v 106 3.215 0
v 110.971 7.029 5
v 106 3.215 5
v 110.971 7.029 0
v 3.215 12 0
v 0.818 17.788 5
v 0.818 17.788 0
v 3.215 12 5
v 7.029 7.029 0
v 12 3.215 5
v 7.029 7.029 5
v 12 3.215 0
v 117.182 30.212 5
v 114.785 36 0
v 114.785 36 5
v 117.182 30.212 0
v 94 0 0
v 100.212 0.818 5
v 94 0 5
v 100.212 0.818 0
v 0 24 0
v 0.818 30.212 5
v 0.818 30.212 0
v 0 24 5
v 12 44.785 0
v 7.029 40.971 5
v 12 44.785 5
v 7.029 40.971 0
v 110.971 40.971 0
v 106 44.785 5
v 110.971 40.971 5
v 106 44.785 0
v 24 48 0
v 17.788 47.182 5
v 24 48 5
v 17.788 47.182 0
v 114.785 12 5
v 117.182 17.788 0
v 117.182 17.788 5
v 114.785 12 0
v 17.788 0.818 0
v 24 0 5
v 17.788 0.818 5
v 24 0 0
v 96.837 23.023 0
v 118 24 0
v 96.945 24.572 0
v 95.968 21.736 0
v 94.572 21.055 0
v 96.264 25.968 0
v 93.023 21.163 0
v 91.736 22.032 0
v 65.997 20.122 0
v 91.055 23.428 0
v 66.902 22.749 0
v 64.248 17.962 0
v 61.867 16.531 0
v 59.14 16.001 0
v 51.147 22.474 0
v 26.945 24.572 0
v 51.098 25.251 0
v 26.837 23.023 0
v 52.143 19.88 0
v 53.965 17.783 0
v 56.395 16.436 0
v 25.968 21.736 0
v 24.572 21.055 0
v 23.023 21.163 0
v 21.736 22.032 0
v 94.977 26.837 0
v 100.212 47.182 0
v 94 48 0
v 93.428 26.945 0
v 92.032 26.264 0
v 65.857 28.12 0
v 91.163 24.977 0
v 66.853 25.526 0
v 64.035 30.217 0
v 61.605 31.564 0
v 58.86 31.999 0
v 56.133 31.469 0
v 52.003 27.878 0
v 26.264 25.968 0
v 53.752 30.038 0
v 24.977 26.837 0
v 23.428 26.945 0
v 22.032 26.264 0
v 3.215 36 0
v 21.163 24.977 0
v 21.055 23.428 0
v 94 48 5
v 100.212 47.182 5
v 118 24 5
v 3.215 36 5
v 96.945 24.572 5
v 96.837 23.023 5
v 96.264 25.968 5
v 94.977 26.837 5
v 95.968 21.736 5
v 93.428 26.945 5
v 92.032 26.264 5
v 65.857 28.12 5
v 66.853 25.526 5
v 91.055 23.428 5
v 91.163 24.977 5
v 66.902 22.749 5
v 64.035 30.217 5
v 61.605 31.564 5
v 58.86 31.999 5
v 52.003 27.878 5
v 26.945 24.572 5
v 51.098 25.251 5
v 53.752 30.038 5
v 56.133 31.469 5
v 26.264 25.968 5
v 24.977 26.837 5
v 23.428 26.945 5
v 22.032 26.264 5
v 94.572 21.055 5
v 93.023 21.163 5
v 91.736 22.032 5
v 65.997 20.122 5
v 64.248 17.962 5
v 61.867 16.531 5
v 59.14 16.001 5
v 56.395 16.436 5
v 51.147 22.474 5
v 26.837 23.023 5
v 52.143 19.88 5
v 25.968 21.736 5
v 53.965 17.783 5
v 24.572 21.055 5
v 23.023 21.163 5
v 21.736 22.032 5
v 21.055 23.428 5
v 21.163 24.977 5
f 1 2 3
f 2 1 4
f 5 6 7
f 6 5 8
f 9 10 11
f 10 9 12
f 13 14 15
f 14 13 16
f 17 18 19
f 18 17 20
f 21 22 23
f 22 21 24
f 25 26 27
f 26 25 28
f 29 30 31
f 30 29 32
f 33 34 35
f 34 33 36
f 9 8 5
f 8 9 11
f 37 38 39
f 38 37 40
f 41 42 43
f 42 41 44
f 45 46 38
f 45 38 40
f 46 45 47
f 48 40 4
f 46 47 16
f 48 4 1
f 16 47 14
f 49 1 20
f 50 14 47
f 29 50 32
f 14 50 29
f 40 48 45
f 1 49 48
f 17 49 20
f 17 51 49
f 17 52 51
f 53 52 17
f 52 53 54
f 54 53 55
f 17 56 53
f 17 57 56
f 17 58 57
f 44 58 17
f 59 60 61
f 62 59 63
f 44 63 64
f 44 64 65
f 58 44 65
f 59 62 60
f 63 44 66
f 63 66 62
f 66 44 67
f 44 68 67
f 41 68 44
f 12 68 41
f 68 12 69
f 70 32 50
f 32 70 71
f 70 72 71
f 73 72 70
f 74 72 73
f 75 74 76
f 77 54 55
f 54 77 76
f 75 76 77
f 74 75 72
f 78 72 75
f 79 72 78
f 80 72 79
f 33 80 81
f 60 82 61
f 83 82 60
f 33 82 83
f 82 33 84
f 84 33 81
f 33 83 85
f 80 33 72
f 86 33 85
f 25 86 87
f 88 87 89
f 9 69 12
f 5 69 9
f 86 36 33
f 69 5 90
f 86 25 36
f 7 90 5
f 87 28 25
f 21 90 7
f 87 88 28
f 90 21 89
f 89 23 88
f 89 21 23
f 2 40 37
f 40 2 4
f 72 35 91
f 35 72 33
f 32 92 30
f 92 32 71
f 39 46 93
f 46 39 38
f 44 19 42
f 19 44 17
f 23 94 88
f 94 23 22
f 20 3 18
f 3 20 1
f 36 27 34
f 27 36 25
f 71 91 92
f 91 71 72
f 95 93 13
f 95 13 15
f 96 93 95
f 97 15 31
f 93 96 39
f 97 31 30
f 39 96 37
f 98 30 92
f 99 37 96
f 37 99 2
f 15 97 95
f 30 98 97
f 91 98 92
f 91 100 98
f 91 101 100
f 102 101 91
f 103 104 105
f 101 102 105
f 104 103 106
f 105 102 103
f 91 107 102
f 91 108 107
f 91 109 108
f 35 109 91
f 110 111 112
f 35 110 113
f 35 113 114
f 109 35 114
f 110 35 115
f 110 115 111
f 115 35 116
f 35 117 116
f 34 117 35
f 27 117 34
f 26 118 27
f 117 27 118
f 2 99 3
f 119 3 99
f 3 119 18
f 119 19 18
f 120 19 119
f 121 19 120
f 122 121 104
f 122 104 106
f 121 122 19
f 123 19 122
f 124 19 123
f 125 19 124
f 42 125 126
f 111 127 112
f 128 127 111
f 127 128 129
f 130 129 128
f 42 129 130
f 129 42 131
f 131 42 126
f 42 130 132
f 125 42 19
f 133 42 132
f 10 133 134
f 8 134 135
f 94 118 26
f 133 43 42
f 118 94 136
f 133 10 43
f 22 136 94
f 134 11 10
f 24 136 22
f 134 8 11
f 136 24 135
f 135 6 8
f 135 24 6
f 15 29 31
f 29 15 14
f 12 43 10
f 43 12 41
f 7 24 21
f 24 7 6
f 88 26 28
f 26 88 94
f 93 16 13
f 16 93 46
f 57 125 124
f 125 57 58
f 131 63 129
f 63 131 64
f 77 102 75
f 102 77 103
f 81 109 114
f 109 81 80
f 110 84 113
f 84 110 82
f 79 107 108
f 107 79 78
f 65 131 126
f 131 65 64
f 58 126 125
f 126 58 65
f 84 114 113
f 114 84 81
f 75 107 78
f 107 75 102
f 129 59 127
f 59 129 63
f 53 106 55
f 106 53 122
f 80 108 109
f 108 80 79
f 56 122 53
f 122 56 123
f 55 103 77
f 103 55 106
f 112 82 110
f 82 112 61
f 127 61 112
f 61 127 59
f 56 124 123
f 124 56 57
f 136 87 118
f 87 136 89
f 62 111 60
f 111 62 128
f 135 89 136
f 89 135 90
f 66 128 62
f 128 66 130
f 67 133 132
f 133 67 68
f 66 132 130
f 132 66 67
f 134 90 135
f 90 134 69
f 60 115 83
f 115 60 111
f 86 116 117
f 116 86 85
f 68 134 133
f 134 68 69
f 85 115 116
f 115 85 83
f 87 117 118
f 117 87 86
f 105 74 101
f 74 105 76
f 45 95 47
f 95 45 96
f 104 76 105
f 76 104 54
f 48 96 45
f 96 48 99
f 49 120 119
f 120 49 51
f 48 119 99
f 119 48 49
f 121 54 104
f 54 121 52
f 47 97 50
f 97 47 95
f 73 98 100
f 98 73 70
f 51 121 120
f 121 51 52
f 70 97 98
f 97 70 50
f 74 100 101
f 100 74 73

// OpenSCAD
$fn = 32;

// ----------------------------------------------------------------------
// Spacer plate: obround span 70, caps R24
// ----------------------------------------------------------------------

// --- parameters (mm) ---
bore_r = 8;               // centre bore radius
bolt_r = 3;               // bolt hole radius
plate_t = 5;              // plate thickness, Z (extrusion height)
span = 70;                // obround span
cap_r = 24;               // cap radius

profile = [[24, 48], [17.788, 47.182], [12, 44.785], [7.029, 40.971], [3.215, 36], [0.818, 30.212], [0, 24], [0.818, 17.788], [3.215, 12], [7.029, 7.029], [12, 3.215], [17.788, 0.818], [24, 0], [94, 0], [100.212, 0.818], [106, 3.215], [110.971, 7.029], [114.785, 12], [117.182, 17.788], [118, 24], [117.182, 30.212], [114.785, 36], [110.971, 40.971], [106, 44.785], [100.212, 47.182], [94, 48]];  // primary outline, 26 points, counter clockwise
void_1 = [[66.853, 25.526], [65.857, 28.12], [64.035, 30.217], [61.605, 31.564], [58.86, 31.999], [56.133, 31.469], [53.752, 30.038], [52.003, 27.878], [51.098, 25.251], [51.147, 22.474], [52.143, 19.88], [53.965, 17.783], [56.395, 16.436], [59.14, 16.001], [61.867, 16.531], [64.248, 17.962], [65.997, 20.122], [66.902, 22.749]];  // centre bore, 18 points
void_2 = [[26.945, 24.572], [26.264, 25.968], [24.977, 26.837], [23.428, 26.945], [22.032, 26.264], [21.163, 24.977], [21.055, 23.428], [21.736, 22.032], [23.023, 21.163], [24.572, 21.055], [25.968, 21.736], [26.837, 23.023]];  // end hole, 12 points
void_3 = [[96.945, 24.572], [96.264, 25.968], [94.977, 26.837], [93.428, 26.945], [92.032, 26.264], [91.163, 24.977], [91.055, 23.428], [91.736, 22.032], [93.023, 21.163], [94.572, 21.055], [95.968, 21.736], [96.837, 23.023]];  // end hole, 12 points

// --- the one profile operation ---
difference() {
  linear_extrude(height = plate_t) polygon(points = profile);
  translate([0, 0, -1])
    linear_extrude(height = plate_t + 2) polygon(points = void_1);
  translate([0, 0, -1])
    linear_extrude(height = plate_t + 2) polygon(points = void_2);
  translate([0, 0, -1])
    linear_extrude(height = plate_t + 2) polygon(points = void_3);
}
